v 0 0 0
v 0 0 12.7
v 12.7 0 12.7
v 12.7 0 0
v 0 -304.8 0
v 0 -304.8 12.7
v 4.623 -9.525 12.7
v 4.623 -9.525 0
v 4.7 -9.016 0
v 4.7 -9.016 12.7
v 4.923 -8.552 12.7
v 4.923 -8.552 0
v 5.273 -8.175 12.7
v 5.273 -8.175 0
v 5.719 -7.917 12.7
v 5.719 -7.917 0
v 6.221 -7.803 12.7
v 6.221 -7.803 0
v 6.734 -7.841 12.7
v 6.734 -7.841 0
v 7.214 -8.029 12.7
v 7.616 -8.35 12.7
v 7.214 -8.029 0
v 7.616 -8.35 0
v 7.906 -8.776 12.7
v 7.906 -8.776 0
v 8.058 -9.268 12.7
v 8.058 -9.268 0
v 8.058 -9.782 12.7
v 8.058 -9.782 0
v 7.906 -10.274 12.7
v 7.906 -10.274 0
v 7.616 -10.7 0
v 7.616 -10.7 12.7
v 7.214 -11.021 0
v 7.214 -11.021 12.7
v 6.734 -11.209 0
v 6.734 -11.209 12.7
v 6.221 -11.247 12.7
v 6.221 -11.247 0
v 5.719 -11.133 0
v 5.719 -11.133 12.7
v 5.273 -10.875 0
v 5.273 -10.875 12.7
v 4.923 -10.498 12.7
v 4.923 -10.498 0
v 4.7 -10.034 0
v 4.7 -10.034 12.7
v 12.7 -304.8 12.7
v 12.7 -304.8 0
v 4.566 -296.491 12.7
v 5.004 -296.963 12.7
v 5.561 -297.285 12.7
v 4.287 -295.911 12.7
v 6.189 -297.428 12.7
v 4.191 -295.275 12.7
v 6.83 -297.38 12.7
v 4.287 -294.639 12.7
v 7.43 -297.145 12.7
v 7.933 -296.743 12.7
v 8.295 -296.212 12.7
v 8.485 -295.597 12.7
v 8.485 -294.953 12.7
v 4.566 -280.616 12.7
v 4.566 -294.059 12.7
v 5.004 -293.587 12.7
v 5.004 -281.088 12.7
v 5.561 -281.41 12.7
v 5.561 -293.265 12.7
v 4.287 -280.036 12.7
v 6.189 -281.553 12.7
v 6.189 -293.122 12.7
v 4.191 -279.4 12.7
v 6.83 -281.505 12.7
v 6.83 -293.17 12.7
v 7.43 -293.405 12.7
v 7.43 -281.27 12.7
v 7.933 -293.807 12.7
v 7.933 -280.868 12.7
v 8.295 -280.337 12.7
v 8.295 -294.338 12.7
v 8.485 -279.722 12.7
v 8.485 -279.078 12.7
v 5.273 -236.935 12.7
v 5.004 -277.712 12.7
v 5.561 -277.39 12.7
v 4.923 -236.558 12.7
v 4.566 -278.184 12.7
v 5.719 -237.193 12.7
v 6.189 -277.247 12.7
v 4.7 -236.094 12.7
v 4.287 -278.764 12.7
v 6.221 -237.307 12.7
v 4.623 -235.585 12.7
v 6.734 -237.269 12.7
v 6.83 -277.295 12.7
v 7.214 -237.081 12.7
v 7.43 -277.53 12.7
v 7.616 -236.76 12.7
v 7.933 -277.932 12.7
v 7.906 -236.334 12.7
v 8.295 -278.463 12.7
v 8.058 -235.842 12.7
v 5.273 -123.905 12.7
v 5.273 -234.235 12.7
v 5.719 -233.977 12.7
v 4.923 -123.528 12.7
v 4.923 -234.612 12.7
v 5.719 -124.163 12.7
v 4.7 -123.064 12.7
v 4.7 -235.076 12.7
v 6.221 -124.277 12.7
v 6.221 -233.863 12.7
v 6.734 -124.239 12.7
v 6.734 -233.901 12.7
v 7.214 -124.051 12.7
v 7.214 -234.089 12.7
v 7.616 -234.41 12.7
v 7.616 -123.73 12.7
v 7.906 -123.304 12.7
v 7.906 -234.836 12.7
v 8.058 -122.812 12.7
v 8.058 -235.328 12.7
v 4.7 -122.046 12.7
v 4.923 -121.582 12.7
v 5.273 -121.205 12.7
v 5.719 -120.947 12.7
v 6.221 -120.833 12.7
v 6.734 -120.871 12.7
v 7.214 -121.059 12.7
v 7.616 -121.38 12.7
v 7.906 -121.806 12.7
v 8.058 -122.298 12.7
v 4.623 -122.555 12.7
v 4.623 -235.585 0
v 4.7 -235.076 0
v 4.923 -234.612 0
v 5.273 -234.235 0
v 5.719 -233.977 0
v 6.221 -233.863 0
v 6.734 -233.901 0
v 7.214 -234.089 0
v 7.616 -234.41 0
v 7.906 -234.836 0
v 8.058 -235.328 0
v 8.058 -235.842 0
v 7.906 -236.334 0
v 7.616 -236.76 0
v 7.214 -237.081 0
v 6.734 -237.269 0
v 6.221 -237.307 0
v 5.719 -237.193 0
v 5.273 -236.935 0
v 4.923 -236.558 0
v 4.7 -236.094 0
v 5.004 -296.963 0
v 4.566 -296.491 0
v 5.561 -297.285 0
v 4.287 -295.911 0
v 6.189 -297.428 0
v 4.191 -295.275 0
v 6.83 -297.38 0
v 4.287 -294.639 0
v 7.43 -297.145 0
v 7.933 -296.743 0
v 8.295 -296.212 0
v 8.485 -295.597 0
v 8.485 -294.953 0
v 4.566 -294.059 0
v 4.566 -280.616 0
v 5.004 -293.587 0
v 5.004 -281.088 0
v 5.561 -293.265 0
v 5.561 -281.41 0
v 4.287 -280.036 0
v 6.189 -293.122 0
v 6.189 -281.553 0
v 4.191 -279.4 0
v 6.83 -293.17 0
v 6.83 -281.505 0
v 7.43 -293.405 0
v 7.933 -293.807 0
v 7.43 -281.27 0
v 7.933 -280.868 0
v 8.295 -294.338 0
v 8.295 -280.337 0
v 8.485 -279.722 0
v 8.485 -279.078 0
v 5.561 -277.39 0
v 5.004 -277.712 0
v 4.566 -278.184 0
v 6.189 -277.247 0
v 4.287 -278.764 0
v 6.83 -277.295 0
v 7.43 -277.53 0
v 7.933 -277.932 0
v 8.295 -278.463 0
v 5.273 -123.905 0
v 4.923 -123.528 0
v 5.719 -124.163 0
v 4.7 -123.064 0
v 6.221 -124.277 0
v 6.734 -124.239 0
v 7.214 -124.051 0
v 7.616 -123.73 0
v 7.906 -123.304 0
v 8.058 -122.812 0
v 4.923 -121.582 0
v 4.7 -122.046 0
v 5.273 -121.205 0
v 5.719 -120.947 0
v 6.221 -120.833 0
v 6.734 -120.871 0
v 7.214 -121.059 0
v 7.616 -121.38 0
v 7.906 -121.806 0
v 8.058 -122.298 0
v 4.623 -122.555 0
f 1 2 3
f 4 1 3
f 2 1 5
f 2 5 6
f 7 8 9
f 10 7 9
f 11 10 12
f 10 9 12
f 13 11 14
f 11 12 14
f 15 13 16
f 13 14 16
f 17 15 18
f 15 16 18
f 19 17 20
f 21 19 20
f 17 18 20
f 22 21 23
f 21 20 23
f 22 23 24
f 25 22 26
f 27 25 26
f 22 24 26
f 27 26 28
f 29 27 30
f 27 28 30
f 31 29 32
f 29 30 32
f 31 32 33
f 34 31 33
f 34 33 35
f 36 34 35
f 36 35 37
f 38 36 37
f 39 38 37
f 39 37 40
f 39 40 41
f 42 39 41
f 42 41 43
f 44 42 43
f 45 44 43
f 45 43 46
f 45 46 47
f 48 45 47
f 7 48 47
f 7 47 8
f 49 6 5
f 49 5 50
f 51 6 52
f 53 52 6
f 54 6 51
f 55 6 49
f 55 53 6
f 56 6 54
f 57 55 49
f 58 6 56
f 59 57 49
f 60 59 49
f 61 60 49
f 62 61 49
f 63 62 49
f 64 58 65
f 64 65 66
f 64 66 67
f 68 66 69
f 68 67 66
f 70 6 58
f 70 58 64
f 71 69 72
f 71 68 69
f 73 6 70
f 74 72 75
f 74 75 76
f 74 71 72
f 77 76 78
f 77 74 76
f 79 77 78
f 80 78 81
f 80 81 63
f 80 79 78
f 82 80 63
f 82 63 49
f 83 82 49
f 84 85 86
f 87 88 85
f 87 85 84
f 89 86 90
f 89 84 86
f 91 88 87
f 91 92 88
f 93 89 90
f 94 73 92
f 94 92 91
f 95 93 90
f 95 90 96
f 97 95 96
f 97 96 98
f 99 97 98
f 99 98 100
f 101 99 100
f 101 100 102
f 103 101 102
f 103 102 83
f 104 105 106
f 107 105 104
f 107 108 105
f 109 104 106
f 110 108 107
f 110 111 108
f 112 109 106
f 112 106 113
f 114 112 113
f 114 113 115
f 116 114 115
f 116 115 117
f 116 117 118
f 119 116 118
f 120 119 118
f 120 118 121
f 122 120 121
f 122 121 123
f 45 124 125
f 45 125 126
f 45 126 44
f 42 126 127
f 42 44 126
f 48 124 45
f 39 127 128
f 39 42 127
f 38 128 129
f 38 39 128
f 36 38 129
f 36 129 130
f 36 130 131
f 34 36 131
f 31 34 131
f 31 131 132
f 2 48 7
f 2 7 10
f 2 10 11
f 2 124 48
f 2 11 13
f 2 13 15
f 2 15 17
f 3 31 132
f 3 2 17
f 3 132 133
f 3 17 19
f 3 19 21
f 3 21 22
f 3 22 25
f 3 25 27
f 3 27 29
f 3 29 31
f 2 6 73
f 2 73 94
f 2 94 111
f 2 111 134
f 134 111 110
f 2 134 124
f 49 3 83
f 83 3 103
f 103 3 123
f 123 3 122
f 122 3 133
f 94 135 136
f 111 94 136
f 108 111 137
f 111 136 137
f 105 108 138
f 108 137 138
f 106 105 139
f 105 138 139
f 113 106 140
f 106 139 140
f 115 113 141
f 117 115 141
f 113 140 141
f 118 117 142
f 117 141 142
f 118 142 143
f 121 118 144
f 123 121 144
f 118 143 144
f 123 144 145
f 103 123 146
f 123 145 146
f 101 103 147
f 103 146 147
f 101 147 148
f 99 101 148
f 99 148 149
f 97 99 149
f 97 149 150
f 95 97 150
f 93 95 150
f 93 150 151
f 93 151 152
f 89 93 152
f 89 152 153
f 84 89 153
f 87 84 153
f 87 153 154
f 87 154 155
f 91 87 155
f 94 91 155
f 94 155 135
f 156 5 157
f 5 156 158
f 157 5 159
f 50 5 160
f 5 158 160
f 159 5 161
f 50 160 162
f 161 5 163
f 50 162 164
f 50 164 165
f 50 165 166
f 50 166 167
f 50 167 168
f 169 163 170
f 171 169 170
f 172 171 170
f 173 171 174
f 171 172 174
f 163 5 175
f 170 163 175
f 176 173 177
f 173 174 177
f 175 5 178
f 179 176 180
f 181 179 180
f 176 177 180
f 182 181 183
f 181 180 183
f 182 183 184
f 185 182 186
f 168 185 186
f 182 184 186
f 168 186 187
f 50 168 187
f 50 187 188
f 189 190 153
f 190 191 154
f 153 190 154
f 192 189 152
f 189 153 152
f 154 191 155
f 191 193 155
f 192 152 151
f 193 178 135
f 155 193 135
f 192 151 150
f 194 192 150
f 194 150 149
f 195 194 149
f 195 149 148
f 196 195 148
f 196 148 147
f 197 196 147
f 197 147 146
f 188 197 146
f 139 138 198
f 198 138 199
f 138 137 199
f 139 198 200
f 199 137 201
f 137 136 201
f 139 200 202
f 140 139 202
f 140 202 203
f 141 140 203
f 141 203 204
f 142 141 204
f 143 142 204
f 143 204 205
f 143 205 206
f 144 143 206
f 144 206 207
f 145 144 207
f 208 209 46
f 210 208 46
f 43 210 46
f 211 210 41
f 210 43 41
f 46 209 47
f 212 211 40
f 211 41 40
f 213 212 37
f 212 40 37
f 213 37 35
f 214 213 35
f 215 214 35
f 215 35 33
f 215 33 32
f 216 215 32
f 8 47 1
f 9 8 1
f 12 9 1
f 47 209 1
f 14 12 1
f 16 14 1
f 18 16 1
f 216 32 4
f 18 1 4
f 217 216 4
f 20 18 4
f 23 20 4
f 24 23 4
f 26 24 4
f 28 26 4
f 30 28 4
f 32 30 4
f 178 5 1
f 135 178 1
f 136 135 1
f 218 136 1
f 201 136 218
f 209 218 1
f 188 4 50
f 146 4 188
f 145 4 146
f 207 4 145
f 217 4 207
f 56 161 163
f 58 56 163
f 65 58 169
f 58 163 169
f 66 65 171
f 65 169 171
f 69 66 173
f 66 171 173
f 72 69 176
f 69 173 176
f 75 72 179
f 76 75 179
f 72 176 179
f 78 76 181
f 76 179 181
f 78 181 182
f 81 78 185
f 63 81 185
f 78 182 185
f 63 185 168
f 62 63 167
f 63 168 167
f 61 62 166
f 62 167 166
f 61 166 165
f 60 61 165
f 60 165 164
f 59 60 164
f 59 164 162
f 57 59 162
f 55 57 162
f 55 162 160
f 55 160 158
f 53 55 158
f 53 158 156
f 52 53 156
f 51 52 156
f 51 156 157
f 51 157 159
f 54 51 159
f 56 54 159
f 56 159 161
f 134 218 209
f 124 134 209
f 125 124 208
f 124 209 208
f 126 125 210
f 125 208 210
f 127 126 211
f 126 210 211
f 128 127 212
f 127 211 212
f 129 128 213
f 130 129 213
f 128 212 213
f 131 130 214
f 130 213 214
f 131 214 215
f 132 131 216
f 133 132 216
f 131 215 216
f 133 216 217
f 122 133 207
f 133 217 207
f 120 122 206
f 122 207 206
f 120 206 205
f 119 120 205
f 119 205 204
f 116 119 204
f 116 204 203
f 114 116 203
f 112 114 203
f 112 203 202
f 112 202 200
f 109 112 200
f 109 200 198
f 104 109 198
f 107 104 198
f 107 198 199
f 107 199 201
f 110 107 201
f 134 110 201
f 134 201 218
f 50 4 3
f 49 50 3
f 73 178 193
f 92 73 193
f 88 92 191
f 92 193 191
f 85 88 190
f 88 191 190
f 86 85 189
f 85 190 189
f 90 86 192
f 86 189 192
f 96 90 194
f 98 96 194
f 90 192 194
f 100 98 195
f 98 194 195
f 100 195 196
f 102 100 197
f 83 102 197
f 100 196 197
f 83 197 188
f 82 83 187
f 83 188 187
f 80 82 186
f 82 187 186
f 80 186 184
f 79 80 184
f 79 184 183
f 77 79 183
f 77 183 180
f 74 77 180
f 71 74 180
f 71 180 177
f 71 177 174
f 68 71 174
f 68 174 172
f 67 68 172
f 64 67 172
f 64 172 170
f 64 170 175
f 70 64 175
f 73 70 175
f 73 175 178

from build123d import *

# Parameters (mm, degrees)
F0_W     = 12.7
F0_H     = 12.7
F1_DEPTH = 304.8
F3_D     = 3.4544
F5_D     = 4.318


with BuildPart() as f1:
    # F0 (on Front) → F1 (new body)
    with BuildSketch(Plane.XZ):
        with Locations((6.35, 6.35)):
            Rectangle(F0_W, F0_H)
    extrude(amount=F1_DEPTH)

    # F3 (through all)
    with Locations(Plane.XY.offset(12.7)):
        with Locations((6.35, -9.525), (6.35, -122.555), (6.35, -235.585)):
            Hole(F3_D / 2)

    # F5 (through all)
    with Locations(Plane.XY.offset(12.7)):
        with Locations((6.35, -295.275), (6.35, -279.4)):
            Hole(F5_D / 2)


solid = f1.part
